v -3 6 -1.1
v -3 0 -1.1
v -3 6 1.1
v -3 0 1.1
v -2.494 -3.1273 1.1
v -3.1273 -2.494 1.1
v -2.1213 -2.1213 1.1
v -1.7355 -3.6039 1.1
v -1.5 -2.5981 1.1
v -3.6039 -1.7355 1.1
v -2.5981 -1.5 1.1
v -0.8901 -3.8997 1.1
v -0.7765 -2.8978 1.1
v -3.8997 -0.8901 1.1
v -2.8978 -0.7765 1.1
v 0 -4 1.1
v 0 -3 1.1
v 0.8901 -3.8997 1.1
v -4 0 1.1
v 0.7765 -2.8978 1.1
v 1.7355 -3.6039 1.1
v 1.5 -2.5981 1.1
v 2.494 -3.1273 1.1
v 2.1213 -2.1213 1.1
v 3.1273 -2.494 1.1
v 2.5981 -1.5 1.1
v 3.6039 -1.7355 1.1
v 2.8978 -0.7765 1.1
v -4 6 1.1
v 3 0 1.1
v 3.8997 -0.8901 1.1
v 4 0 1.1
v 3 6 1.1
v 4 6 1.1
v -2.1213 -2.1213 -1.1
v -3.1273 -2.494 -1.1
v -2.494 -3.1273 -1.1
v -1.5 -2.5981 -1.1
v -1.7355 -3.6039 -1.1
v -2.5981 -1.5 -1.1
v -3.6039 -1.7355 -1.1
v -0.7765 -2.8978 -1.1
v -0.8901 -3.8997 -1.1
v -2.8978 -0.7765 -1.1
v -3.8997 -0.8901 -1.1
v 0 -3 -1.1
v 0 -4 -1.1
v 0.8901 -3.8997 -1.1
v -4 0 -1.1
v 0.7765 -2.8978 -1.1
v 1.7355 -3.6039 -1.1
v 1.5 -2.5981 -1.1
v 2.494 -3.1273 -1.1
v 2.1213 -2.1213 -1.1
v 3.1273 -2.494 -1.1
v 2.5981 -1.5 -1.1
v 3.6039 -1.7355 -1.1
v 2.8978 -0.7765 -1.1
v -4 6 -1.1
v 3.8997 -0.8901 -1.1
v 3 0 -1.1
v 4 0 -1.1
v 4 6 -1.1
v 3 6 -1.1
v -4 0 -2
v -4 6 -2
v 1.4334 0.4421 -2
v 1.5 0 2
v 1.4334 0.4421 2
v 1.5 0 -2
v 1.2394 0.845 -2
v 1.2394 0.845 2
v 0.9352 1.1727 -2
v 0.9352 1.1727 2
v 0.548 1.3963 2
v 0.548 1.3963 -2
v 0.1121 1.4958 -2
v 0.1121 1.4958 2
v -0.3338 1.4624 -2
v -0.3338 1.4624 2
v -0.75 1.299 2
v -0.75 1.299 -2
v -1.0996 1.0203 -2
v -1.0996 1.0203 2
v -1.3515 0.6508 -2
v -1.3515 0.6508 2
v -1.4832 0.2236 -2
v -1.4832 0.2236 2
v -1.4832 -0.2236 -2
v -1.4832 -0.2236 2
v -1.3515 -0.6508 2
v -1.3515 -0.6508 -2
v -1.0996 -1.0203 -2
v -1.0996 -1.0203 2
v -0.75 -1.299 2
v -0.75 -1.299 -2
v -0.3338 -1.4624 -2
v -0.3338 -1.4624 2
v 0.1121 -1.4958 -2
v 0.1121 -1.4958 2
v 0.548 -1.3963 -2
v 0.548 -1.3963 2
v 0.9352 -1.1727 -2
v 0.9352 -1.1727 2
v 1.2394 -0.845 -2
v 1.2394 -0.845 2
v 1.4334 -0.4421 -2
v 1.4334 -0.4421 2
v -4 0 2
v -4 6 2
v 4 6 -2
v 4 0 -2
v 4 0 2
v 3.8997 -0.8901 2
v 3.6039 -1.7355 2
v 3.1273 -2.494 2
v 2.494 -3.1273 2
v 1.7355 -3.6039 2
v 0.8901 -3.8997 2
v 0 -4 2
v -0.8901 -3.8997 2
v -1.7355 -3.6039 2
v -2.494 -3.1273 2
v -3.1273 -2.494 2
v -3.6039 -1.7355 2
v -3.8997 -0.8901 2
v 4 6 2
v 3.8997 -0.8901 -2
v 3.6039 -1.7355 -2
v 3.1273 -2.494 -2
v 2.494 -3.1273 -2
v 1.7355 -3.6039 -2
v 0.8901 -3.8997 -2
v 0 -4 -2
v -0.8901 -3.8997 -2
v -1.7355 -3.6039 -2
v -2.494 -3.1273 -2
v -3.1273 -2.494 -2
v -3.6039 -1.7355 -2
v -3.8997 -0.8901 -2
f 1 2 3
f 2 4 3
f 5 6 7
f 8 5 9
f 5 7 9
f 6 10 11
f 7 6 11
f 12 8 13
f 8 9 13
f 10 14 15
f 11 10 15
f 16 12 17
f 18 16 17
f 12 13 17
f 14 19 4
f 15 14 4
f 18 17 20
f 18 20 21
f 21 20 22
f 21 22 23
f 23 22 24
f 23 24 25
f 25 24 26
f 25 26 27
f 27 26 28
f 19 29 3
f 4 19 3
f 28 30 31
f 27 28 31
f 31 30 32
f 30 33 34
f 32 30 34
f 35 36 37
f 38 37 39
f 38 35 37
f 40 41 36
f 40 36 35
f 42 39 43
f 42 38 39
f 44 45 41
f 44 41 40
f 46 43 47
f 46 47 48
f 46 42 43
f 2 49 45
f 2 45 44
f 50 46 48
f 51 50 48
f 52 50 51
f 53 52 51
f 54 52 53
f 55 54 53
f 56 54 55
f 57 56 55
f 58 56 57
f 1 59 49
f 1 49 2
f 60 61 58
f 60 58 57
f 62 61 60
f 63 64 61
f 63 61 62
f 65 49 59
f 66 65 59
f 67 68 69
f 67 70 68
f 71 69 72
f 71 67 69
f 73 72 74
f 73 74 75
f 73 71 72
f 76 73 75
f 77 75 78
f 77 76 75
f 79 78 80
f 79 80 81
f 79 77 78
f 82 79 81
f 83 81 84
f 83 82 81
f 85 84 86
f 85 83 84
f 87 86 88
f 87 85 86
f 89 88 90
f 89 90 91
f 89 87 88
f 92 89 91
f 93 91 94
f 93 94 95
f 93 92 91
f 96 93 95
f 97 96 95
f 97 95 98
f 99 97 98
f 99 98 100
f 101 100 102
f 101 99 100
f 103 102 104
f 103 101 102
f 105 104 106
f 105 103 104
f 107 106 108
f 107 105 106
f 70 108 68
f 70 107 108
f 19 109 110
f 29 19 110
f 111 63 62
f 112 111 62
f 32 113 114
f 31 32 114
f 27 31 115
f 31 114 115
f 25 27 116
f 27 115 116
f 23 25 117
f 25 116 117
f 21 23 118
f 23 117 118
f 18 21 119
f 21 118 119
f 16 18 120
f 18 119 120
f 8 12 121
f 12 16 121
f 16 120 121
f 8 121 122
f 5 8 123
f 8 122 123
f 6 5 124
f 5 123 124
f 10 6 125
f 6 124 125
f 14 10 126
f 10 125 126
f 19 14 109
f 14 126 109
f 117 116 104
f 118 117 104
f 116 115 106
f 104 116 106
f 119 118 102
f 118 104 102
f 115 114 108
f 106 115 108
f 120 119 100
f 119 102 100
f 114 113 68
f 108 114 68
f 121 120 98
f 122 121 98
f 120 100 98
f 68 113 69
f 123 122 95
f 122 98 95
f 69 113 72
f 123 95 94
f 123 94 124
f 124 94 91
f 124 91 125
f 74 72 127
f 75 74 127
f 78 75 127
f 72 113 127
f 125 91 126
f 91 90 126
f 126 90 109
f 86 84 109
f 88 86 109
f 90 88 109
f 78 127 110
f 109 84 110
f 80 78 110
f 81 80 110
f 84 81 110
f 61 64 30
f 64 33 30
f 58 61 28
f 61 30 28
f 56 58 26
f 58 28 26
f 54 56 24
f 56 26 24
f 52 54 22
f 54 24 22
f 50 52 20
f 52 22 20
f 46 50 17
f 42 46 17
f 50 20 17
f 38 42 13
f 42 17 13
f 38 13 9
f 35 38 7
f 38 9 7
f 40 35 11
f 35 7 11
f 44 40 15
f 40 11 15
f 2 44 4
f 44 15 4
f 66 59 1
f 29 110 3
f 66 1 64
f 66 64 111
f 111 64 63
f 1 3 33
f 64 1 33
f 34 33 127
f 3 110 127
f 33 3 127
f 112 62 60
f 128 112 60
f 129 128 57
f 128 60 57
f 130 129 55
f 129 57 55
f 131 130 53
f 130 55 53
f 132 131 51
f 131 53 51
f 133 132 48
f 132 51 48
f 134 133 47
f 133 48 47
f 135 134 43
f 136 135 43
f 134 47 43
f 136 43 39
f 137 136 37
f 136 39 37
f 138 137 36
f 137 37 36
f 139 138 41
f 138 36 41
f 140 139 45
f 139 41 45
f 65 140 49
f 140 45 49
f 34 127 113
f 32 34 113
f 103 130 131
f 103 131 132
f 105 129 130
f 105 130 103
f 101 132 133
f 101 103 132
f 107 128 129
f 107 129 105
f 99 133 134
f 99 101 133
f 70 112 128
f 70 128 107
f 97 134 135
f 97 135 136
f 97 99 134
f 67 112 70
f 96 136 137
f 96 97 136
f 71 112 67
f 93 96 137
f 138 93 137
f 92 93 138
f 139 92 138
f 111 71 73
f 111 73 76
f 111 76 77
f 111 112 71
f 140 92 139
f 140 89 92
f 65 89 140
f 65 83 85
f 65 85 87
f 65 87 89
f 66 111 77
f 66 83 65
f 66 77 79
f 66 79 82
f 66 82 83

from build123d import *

# Parameters (mm, degrees)
SKIZZE1_R                       = 1.5
AUFSATZ_LINEAR_AUSTRAGEN1_DEPTH = 2
SKIZZE2_OUTSIDE_W               = 12.684
SKIZZE2_OUTSIDE_H               = 14.684
SCHNITT_LINEAR_AUSTRAGEN1_DEPTH = 1.1


with BuildPart() as part:
    # Skizze1 → Aufsatz-Linear austragen1 (new body, symmetric)
    with BuildSketch(Plane.XY):
        with BuildLine():
            Line((-4, 0), (-4, 6))
            Line((-4, 6), (4, 6))
            Line((4, 6), (4, 0))
            ThreePointArc((4, 0), (0, -4), (-4, 0))
        make_face()
        Circle(SKIZZE1_R, mode=Mode.SUBTRACT)
    extrude(amount=AUFSATZ_LINEAR_AUSTRAGEN1_DEPTH, both=True)

    # Skizze2 outside → Schnitt-Linear austragen1 (cut, symmetric)
    with BuildSketch(Plane.XY):
        with Locations((0, 1)):
            Rectangle(SKIZZE2_OUTSIDE_W, SKIZZE2_OUTSIDE_H)
        with BuildLine():
            Line((-3, 6), (3, 6))
            Line((3, 6), (3, 0))
            ThreePointArc((3, 0), (0, -3), (-3, 0))
            Line((-3, 0), (-3, 6))
        make_face(mode=Mode.SUBTRACT)
    extrude(amount=SCHNITT_LINEAR_AUSTRAGEN1_DEPTH, both=True, mode=Mode.SUBTRACT)


solid = part.part
